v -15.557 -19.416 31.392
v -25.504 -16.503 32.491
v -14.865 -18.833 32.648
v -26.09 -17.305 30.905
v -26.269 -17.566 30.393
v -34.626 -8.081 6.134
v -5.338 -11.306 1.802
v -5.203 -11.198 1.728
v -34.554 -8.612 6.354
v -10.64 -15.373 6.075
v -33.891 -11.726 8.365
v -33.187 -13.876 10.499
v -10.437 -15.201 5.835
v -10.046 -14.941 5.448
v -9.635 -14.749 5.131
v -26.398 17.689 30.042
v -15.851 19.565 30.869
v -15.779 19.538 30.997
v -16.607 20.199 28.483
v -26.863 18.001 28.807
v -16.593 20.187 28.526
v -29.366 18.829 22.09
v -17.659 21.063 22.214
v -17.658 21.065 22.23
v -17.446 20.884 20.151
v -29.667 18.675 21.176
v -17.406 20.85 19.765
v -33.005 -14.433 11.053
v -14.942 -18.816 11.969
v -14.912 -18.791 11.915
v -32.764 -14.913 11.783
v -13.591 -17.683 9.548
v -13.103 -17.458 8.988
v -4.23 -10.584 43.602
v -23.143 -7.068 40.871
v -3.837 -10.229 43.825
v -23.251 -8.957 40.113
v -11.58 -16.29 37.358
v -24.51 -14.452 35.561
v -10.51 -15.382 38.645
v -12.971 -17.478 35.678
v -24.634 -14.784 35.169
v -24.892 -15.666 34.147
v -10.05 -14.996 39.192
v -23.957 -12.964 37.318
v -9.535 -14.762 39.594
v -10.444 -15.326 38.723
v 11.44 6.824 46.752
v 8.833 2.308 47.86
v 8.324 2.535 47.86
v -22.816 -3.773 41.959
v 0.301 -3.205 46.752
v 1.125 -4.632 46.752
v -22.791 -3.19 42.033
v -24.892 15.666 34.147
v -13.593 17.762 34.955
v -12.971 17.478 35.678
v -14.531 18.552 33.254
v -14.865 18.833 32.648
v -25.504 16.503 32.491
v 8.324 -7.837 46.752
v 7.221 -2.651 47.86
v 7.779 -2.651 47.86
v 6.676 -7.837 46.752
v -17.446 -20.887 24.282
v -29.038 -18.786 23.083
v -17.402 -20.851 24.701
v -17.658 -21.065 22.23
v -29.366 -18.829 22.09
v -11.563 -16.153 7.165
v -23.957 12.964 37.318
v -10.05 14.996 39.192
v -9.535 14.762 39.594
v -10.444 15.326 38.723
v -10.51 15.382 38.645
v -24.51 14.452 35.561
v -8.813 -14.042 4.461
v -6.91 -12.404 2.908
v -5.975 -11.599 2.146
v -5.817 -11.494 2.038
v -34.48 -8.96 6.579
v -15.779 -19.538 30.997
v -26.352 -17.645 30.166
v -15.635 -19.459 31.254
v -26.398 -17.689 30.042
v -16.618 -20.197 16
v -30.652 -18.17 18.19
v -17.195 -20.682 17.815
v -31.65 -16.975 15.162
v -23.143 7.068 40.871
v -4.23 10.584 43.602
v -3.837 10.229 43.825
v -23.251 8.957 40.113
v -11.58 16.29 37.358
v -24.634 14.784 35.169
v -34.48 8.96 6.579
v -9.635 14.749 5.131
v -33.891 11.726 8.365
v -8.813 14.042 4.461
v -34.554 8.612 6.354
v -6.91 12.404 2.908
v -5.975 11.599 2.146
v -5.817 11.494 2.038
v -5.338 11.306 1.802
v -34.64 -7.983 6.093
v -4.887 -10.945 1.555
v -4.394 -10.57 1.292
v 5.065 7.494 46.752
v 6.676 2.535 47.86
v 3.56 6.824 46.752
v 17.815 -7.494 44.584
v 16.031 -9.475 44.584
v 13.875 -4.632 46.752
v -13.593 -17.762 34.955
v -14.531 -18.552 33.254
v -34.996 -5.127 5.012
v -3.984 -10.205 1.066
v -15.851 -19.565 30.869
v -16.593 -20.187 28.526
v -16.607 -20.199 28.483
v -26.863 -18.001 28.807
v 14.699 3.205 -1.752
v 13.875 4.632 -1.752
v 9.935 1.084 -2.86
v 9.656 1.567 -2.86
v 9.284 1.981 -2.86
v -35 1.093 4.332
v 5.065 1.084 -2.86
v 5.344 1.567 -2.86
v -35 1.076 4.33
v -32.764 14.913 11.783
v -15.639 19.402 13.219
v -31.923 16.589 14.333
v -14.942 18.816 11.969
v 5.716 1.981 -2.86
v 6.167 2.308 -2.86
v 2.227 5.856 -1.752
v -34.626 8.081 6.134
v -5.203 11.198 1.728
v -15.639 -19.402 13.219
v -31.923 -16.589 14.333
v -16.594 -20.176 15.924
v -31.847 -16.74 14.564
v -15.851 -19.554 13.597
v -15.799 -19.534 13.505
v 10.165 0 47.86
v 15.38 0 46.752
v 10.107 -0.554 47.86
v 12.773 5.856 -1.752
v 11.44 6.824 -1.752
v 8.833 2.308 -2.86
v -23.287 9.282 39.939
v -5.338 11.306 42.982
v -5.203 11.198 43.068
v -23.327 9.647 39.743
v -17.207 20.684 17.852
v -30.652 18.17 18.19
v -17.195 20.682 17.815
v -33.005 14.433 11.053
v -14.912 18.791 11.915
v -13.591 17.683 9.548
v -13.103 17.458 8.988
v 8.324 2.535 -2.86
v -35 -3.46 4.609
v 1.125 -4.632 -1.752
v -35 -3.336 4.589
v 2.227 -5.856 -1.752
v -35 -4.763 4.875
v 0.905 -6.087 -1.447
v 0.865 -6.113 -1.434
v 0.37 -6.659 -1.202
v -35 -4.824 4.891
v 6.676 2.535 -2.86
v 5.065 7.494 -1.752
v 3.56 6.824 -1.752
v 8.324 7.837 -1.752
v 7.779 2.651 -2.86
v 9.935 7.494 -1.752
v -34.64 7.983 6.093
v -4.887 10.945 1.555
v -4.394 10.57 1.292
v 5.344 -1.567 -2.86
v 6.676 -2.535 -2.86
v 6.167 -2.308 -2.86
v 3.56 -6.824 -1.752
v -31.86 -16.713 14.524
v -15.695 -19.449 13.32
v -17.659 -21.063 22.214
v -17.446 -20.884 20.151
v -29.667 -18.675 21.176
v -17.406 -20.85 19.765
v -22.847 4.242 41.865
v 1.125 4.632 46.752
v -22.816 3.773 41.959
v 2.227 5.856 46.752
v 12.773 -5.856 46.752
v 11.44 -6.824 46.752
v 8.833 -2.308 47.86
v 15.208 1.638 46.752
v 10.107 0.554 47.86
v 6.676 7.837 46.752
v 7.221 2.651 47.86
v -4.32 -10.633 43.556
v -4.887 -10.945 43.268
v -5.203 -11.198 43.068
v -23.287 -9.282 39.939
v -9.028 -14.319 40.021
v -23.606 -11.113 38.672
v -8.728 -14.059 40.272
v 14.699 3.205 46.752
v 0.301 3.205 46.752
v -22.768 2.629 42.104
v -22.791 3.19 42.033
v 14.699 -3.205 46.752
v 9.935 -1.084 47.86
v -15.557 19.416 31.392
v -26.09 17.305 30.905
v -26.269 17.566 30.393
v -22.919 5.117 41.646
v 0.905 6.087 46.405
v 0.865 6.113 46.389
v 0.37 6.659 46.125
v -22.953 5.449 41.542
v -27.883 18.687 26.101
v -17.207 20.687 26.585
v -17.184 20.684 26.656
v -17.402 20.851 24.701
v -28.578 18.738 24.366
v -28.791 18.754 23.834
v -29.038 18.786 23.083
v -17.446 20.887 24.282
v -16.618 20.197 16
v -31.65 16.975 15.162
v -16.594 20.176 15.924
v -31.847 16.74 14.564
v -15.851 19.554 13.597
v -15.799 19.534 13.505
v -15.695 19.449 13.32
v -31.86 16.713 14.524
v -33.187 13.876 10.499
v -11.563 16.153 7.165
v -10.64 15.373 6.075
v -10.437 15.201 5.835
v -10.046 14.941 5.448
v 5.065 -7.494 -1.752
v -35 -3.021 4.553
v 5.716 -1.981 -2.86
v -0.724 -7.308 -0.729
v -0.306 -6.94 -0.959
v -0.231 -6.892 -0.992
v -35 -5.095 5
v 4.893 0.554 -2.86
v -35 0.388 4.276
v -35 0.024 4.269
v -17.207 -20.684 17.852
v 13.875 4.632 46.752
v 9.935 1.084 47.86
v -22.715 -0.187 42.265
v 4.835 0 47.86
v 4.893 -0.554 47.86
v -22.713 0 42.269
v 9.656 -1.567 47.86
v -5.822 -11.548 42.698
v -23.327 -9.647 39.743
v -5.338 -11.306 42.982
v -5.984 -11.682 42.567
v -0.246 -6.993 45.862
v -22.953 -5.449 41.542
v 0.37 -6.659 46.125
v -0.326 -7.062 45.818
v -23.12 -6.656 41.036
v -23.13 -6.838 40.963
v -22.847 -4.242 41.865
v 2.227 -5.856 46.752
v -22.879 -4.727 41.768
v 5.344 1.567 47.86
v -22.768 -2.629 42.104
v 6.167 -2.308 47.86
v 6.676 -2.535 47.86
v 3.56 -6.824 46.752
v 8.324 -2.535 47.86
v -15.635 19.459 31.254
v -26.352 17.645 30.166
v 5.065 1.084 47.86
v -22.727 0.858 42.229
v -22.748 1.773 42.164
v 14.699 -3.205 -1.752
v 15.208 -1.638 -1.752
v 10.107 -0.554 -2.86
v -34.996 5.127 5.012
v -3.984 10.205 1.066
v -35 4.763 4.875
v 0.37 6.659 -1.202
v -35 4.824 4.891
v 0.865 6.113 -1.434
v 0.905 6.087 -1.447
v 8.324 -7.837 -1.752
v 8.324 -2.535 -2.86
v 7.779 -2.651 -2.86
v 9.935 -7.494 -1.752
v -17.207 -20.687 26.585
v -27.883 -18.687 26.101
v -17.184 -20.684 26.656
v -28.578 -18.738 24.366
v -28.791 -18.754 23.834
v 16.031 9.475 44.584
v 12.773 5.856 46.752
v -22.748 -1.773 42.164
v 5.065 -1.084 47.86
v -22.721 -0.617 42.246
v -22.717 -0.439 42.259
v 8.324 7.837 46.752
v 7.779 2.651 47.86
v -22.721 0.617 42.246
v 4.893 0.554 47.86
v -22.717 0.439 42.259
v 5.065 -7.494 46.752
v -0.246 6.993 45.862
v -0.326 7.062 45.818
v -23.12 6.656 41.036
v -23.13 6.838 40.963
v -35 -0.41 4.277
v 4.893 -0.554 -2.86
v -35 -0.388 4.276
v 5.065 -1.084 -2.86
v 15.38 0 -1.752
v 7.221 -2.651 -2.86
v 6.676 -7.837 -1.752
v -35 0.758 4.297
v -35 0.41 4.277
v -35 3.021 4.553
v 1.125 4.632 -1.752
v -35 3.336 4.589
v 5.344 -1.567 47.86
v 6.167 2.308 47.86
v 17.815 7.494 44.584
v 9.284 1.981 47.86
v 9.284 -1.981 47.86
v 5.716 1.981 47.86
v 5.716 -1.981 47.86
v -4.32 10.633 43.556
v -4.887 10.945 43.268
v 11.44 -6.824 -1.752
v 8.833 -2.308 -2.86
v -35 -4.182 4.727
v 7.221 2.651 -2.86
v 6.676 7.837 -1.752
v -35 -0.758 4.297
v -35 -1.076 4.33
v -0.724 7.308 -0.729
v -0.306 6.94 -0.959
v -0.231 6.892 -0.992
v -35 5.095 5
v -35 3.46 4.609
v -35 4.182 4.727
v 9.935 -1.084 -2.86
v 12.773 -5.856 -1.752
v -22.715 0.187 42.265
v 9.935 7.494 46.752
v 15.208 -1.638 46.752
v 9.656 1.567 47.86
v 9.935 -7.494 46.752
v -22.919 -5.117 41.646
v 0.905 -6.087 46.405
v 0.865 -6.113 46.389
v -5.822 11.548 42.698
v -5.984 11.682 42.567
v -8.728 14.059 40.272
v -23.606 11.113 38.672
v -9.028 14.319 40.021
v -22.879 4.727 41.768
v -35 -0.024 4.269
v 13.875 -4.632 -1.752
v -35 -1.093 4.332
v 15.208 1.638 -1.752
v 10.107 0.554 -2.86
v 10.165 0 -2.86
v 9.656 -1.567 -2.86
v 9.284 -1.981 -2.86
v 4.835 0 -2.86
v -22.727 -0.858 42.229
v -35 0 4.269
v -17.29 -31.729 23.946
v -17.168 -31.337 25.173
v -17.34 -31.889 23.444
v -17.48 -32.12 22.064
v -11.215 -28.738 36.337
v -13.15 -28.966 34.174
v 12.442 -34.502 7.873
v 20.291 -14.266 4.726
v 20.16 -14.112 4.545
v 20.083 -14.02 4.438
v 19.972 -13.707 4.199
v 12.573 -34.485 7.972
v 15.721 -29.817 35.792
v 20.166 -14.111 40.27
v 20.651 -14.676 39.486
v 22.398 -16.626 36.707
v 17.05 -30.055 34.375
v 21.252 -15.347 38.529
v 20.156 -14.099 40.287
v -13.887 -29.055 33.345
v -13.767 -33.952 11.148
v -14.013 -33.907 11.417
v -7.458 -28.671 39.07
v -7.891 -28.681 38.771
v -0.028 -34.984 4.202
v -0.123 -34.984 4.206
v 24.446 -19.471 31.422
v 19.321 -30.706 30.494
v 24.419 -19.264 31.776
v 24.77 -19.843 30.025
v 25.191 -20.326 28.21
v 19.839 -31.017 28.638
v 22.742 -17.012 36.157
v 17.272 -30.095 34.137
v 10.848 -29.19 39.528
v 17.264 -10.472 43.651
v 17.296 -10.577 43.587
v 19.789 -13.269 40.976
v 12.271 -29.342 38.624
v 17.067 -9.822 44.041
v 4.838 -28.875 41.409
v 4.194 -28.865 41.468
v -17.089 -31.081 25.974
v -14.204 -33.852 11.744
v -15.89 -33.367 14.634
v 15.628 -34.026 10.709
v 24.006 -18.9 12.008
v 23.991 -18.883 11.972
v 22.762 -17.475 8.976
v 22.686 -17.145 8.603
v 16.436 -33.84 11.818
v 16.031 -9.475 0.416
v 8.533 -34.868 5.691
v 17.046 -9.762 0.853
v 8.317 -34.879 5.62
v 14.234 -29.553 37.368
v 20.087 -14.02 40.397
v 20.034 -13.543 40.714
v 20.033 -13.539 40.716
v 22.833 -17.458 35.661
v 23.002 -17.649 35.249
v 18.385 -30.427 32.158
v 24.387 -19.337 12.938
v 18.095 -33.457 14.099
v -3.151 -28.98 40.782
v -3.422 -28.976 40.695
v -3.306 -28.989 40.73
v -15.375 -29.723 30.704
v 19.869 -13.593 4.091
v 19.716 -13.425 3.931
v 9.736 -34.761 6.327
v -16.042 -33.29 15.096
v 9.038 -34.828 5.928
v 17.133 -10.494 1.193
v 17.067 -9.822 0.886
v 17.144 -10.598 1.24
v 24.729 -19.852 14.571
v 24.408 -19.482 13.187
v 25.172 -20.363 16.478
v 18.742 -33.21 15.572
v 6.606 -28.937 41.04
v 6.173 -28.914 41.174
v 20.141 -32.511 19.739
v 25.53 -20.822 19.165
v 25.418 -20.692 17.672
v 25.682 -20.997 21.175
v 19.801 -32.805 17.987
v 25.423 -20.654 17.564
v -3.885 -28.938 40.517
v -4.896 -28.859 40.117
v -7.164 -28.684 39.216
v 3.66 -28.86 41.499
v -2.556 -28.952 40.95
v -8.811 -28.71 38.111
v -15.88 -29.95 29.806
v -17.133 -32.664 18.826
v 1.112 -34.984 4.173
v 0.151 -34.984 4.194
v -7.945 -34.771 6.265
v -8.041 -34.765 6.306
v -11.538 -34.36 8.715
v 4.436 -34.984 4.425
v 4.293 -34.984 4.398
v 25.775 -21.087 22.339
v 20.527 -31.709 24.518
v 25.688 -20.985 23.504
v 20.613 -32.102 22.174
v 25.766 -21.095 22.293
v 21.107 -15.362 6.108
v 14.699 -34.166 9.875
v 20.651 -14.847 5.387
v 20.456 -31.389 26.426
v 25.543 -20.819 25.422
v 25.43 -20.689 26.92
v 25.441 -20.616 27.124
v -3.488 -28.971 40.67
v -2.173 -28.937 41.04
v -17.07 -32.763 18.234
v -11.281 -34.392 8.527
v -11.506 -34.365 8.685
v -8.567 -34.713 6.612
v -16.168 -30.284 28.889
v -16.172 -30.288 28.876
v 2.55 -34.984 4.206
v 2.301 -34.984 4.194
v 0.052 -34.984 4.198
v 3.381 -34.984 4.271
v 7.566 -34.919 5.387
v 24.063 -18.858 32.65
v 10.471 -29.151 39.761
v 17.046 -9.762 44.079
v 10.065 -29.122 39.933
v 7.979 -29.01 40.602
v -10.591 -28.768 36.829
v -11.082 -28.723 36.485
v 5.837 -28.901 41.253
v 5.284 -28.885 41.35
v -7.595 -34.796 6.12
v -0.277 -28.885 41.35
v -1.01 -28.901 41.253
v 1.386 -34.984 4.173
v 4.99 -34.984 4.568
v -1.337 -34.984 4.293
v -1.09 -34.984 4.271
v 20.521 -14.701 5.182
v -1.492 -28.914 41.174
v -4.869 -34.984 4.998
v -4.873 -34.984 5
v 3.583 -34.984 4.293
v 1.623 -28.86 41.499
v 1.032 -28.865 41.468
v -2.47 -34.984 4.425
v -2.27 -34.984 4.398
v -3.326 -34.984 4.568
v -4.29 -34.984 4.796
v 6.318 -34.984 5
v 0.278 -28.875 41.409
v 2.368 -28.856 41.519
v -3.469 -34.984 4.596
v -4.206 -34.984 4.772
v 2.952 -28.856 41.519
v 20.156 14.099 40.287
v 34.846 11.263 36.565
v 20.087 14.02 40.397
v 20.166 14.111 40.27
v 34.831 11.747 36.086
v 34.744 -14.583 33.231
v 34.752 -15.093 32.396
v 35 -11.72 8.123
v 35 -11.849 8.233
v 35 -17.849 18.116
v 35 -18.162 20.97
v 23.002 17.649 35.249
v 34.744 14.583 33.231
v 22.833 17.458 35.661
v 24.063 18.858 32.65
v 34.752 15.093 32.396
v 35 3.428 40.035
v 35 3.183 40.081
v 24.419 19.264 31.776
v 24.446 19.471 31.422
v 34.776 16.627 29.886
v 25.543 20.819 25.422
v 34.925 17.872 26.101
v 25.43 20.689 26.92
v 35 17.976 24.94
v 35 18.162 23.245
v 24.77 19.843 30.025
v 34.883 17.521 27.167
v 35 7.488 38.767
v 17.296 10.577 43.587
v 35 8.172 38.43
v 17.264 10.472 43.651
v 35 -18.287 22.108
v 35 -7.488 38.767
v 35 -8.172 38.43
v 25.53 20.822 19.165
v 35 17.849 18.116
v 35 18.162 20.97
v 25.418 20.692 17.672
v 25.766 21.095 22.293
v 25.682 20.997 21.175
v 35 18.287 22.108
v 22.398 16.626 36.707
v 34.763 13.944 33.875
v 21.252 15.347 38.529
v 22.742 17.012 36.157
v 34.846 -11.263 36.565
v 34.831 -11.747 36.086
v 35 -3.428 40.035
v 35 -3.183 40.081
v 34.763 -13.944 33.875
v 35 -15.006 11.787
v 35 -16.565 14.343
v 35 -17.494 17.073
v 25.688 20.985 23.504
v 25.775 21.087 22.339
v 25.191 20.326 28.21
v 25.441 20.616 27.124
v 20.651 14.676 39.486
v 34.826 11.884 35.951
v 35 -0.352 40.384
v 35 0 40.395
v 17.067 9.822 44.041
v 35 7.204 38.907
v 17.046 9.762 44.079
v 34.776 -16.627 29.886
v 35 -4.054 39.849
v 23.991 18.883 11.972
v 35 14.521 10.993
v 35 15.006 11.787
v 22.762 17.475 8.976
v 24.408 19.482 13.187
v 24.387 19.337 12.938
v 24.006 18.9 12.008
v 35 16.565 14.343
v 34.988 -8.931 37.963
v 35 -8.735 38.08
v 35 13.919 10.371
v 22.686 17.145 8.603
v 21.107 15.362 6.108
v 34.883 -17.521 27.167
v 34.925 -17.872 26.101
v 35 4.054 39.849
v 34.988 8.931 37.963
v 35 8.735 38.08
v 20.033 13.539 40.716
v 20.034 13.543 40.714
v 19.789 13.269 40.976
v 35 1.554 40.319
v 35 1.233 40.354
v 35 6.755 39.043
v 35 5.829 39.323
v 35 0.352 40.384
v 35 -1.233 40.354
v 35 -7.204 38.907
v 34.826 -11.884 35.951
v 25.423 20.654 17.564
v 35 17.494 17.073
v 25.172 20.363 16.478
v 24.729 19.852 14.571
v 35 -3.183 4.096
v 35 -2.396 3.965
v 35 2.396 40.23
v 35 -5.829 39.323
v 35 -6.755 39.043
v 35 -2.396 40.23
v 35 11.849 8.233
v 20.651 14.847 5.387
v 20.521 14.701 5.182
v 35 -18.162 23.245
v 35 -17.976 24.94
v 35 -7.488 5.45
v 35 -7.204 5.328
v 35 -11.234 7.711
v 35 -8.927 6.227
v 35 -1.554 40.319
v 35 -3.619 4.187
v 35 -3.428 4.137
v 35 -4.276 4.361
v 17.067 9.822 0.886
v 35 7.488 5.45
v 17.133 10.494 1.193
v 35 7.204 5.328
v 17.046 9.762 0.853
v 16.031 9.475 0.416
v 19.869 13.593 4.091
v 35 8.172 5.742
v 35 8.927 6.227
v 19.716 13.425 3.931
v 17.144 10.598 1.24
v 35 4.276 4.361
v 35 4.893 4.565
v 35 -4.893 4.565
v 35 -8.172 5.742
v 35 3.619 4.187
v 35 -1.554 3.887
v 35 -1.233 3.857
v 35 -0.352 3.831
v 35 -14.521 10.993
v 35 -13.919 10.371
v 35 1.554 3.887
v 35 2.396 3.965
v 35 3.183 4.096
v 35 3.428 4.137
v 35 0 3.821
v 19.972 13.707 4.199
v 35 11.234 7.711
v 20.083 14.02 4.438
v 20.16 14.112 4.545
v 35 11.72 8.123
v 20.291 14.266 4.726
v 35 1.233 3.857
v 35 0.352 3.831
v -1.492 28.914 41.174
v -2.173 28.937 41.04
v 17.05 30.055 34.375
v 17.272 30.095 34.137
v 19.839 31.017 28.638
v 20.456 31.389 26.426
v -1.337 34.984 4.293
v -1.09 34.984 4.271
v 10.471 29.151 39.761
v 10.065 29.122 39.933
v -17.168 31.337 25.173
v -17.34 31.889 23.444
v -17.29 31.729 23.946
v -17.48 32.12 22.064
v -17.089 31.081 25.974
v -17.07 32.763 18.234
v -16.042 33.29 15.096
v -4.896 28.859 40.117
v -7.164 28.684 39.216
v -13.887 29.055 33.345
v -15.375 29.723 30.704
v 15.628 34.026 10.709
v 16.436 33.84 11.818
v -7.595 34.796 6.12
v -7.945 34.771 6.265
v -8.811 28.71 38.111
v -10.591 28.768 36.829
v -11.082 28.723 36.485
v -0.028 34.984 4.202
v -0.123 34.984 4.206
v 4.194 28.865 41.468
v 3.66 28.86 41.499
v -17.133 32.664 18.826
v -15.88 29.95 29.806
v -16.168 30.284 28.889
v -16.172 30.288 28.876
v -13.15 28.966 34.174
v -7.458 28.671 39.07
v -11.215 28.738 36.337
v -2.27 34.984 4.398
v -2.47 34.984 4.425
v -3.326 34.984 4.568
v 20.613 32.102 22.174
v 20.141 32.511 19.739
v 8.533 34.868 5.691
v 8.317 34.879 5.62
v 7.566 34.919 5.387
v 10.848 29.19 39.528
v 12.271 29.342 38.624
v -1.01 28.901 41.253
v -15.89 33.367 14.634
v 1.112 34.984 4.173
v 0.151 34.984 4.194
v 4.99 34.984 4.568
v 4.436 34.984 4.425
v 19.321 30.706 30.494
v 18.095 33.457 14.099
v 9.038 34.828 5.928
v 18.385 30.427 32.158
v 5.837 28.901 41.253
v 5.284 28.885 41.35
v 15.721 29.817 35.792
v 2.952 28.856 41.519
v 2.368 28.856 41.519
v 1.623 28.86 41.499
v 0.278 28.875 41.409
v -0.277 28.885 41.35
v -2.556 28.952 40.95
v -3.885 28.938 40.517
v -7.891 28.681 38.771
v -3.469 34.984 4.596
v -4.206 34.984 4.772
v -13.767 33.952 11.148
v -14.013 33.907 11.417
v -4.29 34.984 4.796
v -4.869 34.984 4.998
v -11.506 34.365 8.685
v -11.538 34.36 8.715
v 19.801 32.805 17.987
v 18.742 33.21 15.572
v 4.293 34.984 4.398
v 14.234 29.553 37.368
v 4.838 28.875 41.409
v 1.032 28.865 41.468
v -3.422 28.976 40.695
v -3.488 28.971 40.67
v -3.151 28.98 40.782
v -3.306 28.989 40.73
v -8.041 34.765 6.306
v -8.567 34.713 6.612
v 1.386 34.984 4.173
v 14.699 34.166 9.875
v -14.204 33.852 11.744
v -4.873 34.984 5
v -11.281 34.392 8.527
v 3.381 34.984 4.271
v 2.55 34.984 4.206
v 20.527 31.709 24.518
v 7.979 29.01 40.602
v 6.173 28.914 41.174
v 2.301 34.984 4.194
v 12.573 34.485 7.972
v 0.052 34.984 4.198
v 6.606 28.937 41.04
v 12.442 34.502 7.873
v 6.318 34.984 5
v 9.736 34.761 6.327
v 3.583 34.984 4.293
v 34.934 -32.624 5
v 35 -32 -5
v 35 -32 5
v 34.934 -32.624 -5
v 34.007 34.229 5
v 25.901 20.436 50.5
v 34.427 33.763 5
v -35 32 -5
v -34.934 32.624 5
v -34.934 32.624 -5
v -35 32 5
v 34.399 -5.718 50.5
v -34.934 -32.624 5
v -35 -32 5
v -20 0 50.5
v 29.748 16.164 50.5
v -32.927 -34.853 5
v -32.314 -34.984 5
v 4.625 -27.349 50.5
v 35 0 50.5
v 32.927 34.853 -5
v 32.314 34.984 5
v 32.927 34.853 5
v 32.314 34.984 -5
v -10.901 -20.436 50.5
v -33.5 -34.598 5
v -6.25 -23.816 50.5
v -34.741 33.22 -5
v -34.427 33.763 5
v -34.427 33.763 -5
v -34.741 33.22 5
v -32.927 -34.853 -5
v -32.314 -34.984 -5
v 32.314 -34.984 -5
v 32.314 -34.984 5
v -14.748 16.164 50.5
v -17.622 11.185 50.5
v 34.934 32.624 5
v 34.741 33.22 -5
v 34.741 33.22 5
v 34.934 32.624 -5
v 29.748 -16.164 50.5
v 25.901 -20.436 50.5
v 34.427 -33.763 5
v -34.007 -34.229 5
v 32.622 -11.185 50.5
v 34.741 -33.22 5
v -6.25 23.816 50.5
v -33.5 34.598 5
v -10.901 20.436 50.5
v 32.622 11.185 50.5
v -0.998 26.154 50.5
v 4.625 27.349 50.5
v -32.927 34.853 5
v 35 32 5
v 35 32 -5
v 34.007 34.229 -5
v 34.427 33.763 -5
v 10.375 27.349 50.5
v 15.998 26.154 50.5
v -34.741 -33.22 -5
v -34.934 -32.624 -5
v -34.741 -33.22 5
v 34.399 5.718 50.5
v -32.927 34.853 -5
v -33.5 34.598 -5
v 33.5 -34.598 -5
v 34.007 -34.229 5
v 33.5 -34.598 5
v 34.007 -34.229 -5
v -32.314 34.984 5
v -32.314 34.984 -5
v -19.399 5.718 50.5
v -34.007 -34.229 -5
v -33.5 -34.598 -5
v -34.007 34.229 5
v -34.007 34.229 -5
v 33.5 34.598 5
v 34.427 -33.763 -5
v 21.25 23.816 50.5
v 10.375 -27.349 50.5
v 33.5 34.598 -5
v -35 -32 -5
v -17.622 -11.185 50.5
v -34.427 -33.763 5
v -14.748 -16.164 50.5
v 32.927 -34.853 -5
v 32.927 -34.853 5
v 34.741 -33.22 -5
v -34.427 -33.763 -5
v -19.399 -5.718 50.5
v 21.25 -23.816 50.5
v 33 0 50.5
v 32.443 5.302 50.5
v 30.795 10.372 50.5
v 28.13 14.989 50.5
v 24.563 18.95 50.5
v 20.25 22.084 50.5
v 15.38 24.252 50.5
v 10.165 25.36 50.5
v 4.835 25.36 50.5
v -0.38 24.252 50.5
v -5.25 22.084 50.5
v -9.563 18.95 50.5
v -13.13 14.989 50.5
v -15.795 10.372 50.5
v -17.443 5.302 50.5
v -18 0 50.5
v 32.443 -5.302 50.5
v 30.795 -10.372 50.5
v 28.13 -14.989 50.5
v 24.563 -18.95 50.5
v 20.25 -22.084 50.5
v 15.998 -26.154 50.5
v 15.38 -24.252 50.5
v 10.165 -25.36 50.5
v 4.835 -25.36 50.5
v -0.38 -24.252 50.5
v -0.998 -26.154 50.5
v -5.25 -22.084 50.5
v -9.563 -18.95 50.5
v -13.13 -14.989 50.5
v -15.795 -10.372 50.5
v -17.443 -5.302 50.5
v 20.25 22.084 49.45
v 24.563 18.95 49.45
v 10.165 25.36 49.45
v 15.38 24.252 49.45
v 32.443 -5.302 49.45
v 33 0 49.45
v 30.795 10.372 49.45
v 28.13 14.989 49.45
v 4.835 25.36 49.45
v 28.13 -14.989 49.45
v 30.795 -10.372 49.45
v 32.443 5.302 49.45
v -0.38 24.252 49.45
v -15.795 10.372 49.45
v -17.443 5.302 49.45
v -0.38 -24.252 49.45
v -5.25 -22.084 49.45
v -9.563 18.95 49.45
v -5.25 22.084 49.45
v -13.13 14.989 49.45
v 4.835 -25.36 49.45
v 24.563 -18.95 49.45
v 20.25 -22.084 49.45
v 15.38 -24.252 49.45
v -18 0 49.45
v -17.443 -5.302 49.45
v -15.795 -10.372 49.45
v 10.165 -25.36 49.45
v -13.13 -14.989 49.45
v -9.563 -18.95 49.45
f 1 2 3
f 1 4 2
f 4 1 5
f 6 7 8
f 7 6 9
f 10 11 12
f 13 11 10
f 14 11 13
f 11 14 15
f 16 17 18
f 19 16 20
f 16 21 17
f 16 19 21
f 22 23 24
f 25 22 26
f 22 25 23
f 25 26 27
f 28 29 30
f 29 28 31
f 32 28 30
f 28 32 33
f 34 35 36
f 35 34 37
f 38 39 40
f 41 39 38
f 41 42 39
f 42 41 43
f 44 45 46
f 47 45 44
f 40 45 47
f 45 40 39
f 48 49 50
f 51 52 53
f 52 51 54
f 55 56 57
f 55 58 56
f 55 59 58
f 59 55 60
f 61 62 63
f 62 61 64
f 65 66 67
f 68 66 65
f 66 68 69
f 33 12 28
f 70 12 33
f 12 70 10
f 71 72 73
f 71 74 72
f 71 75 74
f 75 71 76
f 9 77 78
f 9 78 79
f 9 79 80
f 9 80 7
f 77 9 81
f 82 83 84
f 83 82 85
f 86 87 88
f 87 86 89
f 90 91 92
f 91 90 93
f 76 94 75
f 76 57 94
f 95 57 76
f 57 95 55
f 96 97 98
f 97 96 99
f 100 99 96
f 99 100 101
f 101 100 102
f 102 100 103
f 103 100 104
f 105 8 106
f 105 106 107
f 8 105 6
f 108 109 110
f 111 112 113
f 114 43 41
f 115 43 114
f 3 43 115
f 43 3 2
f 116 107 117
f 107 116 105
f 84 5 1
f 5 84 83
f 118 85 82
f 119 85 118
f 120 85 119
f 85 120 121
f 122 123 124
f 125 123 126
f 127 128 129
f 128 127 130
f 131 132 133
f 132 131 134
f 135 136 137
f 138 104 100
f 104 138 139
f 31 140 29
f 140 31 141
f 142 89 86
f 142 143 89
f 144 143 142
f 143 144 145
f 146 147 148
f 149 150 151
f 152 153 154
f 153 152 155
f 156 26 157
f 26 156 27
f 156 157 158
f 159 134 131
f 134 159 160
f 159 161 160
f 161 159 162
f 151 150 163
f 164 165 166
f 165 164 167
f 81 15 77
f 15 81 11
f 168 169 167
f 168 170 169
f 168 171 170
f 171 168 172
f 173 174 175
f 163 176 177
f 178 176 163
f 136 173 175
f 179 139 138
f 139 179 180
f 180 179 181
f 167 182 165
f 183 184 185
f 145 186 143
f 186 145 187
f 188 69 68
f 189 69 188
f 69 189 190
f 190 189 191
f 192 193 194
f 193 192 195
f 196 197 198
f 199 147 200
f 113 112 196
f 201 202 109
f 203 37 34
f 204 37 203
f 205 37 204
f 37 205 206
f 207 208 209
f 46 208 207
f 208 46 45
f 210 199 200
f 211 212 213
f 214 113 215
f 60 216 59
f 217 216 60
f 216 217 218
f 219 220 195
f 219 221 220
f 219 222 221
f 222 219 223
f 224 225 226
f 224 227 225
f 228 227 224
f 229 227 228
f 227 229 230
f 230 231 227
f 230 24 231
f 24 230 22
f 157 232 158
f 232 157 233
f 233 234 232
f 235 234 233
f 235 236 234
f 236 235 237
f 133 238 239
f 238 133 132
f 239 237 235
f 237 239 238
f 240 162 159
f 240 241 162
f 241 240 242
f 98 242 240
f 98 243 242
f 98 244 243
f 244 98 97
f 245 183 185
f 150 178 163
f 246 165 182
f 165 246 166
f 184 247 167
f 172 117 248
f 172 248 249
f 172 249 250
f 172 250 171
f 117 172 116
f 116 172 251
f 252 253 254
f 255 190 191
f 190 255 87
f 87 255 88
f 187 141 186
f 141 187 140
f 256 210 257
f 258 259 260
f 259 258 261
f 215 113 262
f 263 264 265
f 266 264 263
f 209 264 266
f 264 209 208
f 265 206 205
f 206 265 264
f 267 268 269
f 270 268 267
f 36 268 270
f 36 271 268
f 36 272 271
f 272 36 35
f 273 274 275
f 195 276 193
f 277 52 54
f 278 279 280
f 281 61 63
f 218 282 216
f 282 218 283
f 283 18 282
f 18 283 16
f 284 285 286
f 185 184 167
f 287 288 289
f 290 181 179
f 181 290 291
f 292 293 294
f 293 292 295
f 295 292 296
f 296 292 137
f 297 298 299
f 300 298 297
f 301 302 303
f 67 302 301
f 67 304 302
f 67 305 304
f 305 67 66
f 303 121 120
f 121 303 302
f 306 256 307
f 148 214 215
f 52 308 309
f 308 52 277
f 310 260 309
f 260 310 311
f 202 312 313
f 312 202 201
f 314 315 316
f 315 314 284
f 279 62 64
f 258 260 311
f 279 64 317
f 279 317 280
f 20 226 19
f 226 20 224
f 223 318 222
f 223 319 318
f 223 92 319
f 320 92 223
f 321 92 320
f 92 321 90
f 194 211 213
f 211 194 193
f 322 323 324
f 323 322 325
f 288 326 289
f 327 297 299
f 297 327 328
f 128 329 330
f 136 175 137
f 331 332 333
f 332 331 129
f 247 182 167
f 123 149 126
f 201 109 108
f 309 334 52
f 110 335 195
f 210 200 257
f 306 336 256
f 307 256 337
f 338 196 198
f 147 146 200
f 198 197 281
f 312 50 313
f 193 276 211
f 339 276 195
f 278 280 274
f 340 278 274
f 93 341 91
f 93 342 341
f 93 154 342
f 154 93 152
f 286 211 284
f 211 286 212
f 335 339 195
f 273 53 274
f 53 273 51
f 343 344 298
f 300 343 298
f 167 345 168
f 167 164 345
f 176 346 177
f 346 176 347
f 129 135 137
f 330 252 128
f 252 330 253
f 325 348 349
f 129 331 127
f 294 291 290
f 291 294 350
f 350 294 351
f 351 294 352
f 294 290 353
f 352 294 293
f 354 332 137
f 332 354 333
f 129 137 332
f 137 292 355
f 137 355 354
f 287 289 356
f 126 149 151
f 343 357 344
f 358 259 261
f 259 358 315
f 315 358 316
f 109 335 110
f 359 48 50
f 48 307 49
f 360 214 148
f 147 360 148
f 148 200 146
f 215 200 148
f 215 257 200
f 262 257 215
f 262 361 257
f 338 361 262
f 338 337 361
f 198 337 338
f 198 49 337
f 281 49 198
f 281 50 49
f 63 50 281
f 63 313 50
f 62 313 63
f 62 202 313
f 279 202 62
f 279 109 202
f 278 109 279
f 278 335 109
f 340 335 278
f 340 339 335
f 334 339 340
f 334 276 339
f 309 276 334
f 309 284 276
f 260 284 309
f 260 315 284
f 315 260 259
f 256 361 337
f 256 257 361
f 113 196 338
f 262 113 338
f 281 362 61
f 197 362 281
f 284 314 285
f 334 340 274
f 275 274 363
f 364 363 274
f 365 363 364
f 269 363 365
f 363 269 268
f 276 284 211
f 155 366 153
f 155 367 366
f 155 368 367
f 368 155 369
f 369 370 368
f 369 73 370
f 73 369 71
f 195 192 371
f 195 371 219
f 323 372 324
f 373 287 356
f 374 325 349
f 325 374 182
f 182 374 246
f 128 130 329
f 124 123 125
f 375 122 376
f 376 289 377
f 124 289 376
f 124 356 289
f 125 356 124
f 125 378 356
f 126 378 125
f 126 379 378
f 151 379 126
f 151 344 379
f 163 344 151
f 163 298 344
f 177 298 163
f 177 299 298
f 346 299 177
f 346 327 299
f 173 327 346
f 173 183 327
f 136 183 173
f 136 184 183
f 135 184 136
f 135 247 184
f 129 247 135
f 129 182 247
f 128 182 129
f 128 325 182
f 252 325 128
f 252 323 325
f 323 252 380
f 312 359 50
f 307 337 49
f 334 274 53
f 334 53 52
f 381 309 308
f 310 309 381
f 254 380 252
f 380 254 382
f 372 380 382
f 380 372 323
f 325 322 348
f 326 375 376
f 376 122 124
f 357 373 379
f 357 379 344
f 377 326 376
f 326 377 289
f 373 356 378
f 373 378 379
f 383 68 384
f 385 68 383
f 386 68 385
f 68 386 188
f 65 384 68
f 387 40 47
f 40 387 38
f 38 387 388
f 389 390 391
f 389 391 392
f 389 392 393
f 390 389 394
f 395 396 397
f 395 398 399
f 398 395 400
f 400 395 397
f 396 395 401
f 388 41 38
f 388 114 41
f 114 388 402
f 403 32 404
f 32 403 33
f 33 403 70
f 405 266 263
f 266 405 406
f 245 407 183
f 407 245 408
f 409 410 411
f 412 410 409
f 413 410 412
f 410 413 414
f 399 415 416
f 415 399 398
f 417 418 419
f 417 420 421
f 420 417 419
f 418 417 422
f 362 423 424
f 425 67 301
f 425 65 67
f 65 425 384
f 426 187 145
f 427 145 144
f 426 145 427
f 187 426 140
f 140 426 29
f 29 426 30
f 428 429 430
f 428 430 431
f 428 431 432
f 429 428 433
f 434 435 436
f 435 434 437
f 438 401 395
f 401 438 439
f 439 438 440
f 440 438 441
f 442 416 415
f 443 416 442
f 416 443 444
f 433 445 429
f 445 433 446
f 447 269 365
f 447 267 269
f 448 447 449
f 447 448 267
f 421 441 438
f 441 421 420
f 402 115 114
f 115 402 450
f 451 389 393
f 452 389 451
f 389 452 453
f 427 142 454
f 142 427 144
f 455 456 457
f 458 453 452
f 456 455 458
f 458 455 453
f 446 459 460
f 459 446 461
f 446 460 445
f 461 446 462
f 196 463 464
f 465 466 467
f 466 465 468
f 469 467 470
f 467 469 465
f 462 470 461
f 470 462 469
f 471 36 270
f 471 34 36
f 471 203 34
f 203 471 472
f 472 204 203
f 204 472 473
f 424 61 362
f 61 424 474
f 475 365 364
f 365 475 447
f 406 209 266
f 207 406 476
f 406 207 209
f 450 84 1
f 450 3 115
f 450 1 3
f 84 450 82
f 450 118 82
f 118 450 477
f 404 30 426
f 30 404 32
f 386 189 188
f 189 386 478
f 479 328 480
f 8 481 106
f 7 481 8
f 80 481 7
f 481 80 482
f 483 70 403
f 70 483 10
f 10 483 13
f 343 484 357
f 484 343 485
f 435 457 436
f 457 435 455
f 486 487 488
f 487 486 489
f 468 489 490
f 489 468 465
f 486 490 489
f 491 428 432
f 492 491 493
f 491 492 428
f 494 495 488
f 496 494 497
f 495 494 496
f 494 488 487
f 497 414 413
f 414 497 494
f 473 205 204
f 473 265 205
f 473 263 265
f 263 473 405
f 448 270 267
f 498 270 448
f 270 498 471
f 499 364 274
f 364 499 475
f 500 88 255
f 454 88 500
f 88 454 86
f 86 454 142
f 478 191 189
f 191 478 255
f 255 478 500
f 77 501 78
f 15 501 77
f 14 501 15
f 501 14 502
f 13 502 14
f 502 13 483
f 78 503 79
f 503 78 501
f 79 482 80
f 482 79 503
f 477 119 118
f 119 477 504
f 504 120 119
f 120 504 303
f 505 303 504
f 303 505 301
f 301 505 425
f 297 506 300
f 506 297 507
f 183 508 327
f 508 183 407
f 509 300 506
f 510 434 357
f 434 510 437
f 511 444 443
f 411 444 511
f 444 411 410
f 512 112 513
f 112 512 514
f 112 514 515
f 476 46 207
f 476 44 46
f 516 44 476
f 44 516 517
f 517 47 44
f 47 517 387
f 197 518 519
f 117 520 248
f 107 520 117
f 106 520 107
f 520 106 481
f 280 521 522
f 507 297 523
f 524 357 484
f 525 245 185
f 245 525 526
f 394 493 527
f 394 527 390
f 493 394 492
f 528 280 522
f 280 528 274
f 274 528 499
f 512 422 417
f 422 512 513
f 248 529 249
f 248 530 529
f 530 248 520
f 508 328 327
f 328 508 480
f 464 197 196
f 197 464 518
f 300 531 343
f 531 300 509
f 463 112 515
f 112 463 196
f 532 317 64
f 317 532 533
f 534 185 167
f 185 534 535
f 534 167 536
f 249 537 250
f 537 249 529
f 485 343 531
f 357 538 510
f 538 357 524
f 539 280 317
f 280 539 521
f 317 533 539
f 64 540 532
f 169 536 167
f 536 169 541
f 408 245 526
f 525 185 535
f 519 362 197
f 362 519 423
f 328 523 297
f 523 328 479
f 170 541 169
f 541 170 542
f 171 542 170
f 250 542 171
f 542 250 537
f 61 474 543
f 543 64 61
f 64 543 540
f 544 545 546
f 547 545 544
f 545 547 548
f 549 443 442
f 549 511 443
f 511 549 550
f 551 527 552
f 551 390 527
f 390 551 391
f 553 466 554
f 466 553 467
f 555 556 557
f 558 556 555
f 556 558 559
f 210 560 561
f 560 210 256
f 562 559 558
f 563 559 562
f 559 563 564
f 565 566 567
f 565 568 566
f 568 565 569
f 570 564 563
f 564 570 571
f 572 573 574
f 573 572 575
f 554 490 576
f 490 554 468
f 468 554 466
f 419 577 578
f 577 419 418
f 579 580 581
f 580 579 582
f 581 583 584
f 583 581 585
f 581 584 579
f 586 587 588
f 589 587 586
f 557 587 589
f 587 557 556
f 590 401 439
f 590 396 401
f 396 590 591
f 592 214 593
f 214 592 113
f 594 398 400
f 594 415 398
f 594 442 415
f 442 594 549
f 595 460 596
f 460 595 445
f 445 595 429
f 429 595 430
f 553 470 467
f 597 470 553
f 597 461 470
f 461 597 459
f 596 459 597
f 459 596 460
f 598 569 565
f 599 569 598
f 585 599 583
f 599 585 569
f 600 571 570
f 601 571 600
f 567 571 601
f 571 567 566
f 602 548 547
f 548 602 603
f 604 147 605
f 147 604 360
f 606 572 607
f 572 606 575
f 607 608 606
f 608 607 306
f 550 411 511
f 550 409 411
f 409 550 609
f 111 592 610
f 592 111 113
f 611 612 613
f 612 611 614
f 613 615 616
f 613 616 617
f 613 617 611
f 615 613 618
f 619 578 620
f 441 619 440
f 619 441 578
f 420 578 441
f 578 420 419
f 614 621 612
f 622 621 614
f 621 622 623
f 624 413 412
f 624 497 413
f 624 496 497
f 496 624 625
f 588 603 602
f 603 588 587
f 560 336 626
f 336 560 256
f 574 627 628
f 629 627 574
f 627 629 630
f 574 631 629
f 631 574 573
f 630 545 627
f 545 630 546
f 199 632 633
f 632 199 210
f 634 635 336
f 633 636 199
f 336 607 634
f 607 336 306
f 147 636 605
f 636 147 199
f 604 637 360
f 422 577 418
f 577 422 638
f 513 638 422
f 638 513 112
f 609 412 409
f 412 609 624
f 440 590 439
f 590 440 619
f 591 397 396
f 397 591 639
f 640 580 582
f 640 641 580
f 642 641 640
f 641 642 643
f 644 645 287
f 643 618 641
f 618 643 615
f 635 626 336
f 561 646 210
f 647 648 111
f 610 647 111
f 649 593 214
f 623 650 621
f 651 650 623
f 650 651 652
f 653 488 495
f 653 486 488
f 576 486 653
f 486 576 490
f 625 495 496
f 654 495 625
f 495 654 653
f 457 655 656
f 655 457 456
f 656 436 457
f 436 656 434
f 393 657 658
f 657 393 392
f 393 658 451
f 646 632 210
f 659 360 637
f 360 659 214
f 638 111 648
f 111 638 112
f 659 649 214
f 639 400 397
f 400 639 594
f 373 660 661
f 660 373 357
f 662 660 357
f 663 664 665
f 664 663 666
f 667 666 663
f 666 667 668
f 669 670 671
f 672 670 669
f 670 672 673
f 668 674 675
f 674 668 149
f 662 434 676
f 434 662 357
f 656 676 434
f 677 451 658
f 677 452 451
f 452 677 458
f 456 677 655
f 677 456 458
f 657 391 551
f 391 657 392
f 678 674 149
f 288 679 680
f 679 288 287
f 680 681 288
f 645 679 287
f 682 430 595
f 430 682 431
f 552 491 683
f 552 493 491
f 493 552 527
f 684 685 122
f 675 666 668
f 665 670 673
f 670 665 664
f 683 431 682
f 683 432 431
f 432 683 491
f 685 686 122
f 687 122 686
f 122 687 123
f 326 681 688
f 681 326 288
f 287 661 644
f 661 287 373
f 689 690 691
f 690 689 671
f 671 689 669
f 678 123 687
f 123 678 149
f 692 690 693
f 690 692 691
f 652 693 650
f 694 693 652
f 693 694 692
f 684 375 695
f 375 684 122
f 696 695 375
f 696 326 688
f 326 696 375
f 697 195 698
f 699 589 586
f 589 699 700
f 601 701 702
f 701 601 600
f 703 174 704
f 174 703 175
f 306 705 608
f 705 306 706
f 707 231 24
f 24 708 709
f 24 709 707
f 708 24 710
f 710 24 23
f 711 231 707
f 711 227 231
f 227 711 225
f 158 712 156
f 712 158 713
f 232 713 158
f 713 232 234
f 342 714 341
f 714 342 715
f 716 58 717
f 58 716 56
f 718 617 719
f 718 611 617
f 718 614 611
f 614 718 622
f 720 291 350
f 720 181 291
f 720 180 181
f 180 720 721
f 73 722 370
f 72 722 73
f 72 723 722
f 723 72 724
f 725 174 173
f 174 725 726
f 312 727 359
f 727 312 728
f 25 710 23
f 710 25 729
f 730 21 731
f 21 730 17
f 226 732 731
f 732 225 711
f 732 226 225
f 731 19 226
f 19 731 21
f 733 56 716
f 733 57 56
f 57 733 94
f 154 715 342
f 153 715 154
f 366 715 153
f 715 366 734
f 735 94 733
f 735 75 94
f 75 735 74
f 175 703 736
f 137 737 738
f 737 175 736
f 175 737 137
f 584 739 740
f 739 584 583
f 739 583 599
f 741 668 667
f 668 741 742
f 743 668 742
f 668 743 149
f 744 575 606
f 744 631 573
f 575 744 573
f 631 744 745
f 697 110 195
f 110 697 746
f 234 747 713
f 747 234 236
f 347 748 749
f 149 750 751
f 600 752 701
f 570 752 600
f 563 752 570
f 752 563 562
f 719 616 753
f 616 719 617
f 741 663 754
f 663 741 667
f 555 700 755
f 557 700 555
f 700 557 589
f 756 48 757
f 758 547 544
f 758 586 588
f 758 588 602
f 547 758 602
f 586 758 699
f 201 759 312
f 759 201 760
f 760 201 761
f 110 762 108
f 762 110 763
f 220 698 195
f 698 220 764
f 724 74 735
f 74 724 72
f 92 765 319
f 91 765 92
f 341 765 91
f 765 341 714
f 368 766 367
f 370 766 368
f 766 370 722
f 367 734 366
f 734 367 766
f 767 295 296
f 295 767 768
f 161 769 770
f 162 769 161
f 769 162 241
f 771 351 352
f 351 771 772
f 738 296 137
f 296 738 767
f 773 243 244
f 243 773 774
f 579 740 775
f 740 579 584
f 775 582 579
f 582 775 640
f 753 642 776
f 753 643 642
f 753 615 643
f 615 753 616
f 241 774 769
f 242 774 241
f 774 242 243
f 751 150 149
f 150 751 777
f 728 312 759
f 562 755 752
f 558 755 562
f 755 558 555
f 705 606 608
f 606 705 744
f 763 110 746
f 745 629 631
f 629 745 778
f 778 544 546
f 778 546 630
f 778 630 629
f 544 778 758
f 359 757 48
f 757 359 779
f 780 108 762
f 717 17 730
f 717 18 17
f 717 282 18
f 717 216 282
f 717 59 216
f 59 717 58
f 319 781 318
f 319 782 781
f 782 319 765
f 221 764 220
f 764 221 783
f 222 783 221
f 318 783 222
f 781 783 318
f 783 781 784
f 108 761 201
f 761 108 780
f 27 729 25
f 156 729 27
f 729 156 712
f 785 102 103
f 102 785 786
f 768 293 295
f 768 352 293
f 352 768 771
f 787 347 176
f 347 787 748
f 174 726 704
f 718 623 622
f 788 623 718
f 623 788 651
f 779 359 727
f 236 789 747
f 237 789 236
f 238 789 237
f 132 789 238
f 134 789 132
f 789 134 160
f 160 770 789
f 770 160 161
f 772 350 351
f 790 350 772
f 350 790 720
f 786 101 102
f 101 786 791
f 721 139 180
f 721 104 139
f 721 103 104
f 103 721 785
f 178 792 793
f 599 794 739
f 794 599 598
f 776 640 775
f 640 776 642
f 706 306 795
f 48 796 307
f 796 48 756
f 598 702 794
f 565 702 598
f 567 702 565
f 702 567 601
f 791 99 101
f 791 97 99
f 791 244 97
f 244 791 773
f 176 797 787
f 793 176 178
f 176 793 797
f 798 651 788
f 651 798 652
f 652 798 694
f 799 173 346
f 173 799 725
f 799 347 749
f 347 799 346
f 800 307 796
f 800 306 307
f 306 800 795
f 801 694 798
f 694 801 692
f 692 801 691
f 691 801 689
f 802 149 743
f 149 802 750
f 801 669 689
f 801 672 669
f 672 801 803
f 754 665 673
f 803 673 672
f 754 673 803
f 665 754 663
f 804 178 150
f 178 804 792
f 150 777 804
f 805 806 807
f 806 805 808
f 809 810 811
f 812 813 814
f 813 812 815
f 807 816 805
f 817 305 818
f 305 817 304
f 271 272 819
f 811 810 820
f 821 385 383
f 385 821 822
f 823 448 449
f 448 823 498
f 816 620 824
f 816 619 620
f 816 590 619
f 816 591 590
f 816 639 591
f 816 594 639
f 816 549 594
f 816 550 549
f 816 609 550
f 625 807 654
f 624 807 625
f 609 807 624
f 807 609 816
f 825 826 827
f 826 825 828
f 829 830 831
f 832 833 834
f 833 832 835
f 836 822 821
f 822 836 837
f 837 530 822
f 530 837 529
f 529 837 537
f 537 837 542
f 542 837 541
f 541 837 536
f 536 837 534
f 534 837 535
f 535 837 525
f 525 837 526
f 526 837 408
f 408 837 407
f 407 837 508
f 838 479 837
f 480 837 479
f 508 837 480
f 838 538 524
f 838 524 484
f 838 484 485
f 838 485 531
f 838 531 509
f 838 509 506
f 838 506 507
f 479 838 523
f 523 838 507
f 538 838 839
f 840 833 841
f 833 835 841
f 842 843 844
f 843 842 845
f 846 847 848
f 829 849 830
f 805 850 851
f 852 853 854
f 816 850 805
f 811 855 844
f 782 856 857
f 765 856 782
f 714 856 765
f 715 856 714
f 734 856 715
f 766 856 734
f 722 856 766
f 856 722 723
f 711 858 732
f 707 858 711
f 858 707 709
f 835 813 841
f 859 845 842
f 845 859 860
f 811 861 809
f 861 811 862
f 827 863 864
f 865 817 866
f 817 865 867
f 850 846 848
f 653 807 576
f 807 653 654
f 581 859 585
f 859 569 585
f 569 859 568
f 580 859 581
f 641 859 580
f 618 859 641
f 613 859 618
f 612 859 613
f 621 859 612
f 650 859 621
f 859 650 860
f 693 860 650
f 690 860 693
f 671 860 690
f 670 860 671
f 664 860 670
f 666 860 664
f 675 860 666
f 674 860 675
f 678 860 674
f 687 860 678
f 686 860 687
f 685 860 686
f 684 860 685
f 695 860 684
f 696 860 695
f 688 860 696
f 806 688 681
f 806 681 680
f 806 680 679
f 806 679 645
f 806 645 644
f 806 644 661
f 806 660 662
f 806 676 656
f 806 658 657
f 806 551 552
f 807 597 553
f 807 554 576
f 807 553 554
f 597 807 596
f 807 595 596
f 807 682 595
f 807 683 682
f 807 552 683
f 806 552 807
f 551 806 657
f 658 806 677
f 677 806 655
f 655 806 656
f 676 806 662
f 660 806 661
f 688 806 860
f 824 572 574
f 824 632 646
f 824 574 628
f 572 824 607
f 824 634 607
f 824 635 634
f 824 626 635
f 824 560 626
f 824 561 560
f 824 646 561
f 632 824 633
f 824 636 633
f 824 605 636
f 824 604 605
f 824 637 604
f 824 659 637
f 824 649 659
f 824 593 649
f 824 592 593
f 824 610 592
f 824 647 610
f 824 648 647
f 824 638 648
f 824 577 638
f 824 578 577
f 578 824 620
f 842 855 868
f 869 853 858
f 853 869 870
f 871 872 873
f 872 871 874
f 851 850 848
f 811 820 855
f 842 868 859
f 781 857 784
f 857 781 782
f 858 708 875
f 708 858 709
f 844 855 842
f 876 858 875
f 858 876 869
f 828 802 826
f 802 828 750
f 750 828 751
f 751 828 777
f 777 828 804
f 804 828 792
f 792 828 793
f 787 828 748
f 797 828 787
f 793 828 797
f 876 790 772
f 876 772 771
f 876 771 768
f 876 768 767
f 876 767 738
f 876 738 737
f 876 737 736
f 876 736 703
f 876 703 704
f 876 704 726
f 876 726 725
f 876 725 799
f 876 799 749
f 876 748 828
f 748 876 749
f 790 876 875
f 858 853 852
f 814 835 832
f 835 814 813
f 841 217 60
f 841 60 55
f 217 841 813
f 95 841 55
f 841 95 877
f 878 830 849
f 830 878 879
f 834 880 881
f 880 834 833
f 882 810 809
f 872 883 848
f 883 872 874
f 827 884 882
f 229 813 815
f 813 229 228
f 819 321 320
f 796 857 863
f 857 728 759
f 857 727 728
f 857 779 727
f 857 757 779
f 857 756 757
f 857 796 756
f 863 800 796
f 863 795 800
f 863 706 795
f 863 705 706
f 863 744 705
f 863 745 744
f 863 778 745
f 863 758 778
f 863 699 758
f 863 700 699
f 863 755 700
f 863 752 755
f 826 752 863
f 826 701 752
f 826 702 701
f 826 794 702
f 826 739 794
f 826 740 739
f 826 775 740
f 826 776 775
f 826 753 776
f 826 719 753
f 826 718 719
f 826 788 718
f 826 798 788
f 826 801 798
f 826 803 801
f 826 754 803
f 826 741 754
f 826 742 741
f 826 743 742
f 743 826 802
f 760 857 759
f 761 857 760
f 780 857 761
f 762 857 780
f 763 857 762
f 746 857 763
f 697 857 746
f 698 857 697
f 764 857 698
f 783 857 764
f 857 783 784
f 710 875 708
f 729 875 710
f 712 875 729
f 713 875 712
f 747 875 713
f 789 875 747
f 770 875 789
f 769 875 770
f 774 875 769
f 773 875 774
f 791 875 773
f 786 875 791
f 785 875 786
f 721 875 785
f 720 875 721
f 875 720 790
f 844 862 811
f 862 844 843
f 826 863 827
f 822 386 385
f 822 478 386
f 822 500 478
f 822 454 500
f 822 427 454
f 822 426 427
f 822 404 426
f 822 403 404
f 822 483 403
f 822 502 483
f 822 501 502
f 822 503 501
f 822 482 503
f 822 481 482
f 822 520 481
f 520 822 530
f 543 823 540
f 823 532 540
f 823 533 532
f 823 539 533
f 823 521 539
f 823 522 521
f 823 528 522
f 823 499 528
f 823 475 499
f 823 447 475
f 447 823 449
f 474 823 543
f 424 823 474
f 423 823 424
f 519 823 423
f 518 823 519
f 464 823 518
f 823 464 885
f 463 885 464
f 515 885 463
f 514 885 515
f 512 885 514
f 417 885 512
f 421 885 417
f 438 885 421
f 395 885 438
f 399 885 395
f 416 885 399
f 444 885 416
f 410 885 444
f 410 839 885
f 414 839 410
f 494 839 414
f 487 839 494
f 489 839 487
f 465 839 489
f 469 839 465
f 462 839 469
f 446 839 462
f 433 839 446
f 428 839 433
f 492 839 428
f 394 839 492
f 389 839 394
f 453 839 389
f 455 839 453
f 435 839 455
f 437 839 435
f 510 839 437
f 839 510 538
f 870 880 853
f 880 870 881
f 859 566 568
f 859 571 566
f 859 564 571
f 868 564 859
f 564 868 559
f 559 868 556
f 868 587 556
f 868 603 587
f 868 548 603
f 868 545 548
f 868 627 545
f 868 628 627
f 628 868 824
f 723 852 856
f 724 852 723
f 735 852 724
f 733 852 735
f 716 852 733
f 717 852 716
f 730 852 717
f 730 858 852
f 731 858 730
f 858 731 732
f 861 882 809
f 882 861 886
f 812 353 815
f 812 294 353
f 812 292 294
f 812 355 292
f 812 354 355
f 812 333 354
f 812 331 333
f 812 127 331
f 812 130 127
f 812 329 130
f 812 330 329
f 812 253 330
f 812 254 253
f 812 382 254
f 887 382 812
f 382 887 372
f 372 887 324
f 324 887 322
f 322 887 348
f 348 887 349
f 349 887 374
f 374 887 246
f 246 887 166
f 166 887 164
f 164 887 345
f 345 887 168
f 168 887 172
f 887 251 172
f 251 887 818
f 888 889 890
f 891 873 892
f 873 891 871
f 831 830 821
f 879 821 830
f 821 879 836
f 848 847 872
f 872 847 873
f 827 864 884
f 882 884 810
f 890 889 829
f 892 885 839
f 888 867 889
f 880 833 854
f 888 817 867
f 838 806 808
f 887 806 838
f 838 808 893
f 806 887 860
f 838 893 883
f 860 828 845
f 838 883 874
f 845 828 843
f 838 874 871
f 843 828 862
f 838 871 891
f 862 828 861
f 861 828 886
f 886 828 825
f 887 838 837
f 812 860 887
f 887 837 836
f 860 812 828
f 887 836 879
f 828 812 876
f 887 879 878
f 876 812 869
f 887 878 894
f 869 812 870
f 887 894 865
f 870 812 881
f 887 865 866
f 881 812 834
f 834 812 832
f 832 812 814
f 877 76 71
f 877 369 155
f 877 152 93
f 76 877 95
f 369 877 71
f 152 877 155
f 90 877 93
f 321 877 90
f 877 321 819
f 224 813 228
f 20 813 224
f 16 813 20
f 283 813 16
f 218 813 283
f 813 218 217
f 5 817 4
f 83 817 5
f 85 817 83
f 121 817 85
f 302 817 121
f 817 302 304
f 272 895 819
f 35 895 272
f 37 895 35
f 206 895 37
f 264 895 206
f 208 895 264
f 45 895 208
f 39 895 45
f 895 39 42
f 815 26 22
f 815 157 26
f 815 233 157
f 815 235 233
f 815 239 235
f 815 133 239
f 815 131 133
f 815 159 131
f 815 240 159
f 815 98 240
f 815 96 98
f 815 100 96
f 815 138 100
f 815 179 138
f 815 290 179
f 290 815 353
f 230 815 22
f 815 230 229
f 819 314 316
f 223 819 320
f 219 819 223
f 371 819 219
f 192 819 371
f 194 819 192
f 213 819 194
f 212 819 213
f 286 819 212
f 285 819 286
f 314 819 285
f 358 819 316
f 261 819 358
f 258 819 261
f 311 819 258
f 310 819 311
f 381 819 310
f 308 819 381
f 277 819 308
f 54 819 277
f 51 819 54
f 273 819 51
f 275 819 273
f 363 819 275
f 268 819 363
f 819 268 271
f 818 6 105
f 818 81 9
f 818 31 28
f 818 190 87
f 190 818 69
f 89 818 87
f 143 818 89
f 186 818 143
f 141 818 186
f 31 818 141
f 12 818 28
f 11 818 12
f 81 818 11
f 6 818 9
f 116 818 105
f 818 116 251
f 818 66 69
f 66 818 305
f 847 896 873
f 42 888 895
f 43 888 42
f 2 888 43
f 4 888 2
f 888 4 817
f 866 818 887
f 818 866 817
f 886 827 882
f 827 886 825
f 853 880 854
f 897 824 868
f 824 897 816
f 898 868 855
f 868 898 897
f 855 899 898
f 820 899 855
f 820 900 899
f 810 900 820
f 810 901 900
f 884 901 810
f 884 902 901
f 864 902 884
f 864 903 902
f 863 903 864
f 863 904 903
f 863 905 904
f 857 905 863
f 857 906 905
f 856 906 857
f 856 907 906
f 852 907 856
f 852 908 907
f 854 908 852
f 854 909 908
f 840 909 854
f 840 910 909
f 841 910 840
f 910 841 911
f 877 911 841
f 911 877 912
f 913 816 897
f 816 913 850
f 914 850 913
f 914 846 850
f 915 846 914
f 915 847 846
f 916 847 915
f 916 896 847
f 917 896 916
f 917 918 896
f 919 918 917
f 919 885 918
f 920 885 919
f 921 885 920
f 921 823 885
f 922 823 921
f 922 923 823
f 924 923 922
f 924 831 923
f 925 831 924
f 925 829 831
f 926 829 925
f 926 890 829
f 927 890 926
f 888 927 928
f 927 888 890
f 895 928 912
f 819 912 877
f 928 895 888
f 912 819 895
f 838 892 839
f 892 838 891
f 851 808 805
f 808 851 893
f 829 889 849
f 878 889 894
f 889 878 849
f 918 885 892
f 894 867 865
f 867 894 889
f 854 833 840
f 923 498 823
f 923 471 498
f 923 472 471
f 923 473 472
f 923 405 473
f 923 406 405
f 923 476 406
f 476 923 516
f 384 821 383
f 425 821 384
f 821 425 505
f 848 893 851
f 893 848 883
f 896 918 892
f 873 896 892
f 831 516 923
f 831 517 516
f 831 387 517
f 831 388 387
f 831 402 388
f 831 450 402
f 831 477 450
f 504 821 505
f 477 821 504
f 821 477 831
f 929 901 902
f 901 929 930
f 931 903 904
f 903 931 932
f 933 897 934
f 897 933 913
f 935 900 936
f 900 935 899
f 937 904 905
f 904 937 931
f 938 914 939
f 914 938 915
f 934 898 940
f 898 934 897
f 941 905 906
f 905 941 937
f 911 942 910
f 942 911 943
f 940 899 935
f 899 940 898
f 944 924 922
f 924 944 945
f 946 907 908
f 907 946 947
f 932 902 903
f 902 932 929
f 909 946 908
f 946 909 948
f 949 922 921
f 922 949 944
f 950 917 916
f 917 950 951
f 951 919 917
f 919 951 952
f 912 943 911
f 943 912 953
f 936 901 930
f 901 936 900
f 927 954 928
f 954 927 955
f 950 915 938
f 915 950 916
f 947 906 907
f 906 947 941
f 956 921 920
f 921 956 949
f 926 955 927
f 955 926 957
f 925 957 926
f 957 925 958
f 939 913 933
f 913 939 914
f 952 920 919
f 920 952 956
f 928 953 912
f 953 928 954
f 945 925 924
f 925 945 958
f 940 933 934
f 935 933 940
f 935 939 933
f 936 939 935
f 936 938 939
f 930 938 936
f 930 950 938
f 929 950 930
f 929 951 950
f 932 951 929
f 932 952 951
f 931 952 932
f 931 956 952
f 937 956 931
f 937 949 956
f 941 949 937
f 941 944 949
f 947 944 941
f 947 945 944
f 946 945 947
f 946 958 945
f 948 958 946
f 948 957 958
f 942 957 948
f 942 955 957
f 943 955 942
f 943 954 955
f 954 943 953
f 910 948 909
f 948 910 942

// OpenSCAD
// Camera Stand
$fn=30;
dia = 51;
wall = 2;
base = 70;
height = 50;

v2();

module v2() {
    offset = (base - dia)/2-wall;
    
    difference() {
        hull() {
            roundedcube(size=[base,base,2], radius=3, center=true, apply_to="z");
            translate([offset,0,height]) {
                cylinder(d = dia+wall*2,h=1,center=true);
            }
        }
        translate([offset,0,height]) {
            cylinder(d=dia,h=1.1,center=true);
        }
        translate([0,0,10]) inner(offset);
    }
}

module inner(offset=0) {
//    roundedcube(size=[base+20,base-20,10],radius=6,center=true);
    for(i=[0:3]) {
        hull() {
            rotate([0,0,i*90]) {
                translate([-base/2,0,12]) sphere(r=base/4,center=true);
            }
            translate([offset,0,height/4]) {
                sphere(r=dia/2,center=true);
            }
        }
    }
}

module v1() {
difference() {
    hull() {
        roundedcube(size=[base,base,2], radius=3, center=true, apply_to="z");
        translate([0,0,height]) {
            cylinder(d = dia+wall,h=1,center=true);
        }
    }
    translate([0,0,height]) {
        cylinder(d=dia,h=1.1,center=true);
    }
}
}


// The roundedcube function, shamelessy lifted from:
// https://danielupshaw.com/openscad-rounded-corners/
module roundedcube(size = [1, 1, 1], center = false, radius = 0.5, apply_to = "all") {
	// If single value, convert to [x, y, z] vector
	size = (size[0] == undef) ? [size, size, size] : size;

	translate_min = radius;
	translate_xmax = size[0] - radius;
	translate_ymax = size[1] - radius;
	translate_zmax = size[2] - radius;

	diameter = radius * 2;

	module build_point(type = "sphere", rotate = [0, 0, 0]) {
		if (type == "sphere") {
			sphere(r = radius);
		} else if (type == "cylinder") {
			rotate(a = rotate)
			cylinder(h = diameter, r = radius, center = true);
		}
	}

	obj_translate = (center == false) ?
		[0, 0, 0] : [
			-(size[0] / 2),
			-(size[1] / 2),
			-(size[2] / 2)
		];

	translate(v = obj_translate) {
		hull() {
			for (translate_x = [translate_min, translate_xmax]) {
				x_at = (translate_x == translate_min) ? "min" : "max";
				for (translate_y = [translate_min, translate_ymax]) {
					y_at = (translate_y == translate_min) ? "min" : "max";
					for (translate_z = [translate_min, translate_zmax]) {
						z_at = (translate_z == translate_min) ? "min" : "max";

						translate(v = [translate_x, translate_y, translate_z])
						if (
							(apply_to == "all") ||
							(apply_to == "xmin" && x_at == "min") || (apply_to == "xmax" && x_at == "max") ||
							(apply_to == "ymin" && y_at == "min") || (apply_to == "ymax" && y_at == "max") ||
							(apply_to == "zmin" && z_at == "min") || (apply_to == "zmax" && z_at == "max")
						) {
							build_point("sphere");
						} else {
							rotate = 
								(apply_to == "xmin" || apply_to == "xmax" || apply_to == "x") ? [0, 90, 0] : (
								(apply_to == "ymin" || apply_to == "ymax" || apply_to == "y") ? [90, 90, 0] :
								[0, 0, 0]
							);
							build_point("cylinder", rotate);
						}
					}
				}
			}
		}
	}
}
